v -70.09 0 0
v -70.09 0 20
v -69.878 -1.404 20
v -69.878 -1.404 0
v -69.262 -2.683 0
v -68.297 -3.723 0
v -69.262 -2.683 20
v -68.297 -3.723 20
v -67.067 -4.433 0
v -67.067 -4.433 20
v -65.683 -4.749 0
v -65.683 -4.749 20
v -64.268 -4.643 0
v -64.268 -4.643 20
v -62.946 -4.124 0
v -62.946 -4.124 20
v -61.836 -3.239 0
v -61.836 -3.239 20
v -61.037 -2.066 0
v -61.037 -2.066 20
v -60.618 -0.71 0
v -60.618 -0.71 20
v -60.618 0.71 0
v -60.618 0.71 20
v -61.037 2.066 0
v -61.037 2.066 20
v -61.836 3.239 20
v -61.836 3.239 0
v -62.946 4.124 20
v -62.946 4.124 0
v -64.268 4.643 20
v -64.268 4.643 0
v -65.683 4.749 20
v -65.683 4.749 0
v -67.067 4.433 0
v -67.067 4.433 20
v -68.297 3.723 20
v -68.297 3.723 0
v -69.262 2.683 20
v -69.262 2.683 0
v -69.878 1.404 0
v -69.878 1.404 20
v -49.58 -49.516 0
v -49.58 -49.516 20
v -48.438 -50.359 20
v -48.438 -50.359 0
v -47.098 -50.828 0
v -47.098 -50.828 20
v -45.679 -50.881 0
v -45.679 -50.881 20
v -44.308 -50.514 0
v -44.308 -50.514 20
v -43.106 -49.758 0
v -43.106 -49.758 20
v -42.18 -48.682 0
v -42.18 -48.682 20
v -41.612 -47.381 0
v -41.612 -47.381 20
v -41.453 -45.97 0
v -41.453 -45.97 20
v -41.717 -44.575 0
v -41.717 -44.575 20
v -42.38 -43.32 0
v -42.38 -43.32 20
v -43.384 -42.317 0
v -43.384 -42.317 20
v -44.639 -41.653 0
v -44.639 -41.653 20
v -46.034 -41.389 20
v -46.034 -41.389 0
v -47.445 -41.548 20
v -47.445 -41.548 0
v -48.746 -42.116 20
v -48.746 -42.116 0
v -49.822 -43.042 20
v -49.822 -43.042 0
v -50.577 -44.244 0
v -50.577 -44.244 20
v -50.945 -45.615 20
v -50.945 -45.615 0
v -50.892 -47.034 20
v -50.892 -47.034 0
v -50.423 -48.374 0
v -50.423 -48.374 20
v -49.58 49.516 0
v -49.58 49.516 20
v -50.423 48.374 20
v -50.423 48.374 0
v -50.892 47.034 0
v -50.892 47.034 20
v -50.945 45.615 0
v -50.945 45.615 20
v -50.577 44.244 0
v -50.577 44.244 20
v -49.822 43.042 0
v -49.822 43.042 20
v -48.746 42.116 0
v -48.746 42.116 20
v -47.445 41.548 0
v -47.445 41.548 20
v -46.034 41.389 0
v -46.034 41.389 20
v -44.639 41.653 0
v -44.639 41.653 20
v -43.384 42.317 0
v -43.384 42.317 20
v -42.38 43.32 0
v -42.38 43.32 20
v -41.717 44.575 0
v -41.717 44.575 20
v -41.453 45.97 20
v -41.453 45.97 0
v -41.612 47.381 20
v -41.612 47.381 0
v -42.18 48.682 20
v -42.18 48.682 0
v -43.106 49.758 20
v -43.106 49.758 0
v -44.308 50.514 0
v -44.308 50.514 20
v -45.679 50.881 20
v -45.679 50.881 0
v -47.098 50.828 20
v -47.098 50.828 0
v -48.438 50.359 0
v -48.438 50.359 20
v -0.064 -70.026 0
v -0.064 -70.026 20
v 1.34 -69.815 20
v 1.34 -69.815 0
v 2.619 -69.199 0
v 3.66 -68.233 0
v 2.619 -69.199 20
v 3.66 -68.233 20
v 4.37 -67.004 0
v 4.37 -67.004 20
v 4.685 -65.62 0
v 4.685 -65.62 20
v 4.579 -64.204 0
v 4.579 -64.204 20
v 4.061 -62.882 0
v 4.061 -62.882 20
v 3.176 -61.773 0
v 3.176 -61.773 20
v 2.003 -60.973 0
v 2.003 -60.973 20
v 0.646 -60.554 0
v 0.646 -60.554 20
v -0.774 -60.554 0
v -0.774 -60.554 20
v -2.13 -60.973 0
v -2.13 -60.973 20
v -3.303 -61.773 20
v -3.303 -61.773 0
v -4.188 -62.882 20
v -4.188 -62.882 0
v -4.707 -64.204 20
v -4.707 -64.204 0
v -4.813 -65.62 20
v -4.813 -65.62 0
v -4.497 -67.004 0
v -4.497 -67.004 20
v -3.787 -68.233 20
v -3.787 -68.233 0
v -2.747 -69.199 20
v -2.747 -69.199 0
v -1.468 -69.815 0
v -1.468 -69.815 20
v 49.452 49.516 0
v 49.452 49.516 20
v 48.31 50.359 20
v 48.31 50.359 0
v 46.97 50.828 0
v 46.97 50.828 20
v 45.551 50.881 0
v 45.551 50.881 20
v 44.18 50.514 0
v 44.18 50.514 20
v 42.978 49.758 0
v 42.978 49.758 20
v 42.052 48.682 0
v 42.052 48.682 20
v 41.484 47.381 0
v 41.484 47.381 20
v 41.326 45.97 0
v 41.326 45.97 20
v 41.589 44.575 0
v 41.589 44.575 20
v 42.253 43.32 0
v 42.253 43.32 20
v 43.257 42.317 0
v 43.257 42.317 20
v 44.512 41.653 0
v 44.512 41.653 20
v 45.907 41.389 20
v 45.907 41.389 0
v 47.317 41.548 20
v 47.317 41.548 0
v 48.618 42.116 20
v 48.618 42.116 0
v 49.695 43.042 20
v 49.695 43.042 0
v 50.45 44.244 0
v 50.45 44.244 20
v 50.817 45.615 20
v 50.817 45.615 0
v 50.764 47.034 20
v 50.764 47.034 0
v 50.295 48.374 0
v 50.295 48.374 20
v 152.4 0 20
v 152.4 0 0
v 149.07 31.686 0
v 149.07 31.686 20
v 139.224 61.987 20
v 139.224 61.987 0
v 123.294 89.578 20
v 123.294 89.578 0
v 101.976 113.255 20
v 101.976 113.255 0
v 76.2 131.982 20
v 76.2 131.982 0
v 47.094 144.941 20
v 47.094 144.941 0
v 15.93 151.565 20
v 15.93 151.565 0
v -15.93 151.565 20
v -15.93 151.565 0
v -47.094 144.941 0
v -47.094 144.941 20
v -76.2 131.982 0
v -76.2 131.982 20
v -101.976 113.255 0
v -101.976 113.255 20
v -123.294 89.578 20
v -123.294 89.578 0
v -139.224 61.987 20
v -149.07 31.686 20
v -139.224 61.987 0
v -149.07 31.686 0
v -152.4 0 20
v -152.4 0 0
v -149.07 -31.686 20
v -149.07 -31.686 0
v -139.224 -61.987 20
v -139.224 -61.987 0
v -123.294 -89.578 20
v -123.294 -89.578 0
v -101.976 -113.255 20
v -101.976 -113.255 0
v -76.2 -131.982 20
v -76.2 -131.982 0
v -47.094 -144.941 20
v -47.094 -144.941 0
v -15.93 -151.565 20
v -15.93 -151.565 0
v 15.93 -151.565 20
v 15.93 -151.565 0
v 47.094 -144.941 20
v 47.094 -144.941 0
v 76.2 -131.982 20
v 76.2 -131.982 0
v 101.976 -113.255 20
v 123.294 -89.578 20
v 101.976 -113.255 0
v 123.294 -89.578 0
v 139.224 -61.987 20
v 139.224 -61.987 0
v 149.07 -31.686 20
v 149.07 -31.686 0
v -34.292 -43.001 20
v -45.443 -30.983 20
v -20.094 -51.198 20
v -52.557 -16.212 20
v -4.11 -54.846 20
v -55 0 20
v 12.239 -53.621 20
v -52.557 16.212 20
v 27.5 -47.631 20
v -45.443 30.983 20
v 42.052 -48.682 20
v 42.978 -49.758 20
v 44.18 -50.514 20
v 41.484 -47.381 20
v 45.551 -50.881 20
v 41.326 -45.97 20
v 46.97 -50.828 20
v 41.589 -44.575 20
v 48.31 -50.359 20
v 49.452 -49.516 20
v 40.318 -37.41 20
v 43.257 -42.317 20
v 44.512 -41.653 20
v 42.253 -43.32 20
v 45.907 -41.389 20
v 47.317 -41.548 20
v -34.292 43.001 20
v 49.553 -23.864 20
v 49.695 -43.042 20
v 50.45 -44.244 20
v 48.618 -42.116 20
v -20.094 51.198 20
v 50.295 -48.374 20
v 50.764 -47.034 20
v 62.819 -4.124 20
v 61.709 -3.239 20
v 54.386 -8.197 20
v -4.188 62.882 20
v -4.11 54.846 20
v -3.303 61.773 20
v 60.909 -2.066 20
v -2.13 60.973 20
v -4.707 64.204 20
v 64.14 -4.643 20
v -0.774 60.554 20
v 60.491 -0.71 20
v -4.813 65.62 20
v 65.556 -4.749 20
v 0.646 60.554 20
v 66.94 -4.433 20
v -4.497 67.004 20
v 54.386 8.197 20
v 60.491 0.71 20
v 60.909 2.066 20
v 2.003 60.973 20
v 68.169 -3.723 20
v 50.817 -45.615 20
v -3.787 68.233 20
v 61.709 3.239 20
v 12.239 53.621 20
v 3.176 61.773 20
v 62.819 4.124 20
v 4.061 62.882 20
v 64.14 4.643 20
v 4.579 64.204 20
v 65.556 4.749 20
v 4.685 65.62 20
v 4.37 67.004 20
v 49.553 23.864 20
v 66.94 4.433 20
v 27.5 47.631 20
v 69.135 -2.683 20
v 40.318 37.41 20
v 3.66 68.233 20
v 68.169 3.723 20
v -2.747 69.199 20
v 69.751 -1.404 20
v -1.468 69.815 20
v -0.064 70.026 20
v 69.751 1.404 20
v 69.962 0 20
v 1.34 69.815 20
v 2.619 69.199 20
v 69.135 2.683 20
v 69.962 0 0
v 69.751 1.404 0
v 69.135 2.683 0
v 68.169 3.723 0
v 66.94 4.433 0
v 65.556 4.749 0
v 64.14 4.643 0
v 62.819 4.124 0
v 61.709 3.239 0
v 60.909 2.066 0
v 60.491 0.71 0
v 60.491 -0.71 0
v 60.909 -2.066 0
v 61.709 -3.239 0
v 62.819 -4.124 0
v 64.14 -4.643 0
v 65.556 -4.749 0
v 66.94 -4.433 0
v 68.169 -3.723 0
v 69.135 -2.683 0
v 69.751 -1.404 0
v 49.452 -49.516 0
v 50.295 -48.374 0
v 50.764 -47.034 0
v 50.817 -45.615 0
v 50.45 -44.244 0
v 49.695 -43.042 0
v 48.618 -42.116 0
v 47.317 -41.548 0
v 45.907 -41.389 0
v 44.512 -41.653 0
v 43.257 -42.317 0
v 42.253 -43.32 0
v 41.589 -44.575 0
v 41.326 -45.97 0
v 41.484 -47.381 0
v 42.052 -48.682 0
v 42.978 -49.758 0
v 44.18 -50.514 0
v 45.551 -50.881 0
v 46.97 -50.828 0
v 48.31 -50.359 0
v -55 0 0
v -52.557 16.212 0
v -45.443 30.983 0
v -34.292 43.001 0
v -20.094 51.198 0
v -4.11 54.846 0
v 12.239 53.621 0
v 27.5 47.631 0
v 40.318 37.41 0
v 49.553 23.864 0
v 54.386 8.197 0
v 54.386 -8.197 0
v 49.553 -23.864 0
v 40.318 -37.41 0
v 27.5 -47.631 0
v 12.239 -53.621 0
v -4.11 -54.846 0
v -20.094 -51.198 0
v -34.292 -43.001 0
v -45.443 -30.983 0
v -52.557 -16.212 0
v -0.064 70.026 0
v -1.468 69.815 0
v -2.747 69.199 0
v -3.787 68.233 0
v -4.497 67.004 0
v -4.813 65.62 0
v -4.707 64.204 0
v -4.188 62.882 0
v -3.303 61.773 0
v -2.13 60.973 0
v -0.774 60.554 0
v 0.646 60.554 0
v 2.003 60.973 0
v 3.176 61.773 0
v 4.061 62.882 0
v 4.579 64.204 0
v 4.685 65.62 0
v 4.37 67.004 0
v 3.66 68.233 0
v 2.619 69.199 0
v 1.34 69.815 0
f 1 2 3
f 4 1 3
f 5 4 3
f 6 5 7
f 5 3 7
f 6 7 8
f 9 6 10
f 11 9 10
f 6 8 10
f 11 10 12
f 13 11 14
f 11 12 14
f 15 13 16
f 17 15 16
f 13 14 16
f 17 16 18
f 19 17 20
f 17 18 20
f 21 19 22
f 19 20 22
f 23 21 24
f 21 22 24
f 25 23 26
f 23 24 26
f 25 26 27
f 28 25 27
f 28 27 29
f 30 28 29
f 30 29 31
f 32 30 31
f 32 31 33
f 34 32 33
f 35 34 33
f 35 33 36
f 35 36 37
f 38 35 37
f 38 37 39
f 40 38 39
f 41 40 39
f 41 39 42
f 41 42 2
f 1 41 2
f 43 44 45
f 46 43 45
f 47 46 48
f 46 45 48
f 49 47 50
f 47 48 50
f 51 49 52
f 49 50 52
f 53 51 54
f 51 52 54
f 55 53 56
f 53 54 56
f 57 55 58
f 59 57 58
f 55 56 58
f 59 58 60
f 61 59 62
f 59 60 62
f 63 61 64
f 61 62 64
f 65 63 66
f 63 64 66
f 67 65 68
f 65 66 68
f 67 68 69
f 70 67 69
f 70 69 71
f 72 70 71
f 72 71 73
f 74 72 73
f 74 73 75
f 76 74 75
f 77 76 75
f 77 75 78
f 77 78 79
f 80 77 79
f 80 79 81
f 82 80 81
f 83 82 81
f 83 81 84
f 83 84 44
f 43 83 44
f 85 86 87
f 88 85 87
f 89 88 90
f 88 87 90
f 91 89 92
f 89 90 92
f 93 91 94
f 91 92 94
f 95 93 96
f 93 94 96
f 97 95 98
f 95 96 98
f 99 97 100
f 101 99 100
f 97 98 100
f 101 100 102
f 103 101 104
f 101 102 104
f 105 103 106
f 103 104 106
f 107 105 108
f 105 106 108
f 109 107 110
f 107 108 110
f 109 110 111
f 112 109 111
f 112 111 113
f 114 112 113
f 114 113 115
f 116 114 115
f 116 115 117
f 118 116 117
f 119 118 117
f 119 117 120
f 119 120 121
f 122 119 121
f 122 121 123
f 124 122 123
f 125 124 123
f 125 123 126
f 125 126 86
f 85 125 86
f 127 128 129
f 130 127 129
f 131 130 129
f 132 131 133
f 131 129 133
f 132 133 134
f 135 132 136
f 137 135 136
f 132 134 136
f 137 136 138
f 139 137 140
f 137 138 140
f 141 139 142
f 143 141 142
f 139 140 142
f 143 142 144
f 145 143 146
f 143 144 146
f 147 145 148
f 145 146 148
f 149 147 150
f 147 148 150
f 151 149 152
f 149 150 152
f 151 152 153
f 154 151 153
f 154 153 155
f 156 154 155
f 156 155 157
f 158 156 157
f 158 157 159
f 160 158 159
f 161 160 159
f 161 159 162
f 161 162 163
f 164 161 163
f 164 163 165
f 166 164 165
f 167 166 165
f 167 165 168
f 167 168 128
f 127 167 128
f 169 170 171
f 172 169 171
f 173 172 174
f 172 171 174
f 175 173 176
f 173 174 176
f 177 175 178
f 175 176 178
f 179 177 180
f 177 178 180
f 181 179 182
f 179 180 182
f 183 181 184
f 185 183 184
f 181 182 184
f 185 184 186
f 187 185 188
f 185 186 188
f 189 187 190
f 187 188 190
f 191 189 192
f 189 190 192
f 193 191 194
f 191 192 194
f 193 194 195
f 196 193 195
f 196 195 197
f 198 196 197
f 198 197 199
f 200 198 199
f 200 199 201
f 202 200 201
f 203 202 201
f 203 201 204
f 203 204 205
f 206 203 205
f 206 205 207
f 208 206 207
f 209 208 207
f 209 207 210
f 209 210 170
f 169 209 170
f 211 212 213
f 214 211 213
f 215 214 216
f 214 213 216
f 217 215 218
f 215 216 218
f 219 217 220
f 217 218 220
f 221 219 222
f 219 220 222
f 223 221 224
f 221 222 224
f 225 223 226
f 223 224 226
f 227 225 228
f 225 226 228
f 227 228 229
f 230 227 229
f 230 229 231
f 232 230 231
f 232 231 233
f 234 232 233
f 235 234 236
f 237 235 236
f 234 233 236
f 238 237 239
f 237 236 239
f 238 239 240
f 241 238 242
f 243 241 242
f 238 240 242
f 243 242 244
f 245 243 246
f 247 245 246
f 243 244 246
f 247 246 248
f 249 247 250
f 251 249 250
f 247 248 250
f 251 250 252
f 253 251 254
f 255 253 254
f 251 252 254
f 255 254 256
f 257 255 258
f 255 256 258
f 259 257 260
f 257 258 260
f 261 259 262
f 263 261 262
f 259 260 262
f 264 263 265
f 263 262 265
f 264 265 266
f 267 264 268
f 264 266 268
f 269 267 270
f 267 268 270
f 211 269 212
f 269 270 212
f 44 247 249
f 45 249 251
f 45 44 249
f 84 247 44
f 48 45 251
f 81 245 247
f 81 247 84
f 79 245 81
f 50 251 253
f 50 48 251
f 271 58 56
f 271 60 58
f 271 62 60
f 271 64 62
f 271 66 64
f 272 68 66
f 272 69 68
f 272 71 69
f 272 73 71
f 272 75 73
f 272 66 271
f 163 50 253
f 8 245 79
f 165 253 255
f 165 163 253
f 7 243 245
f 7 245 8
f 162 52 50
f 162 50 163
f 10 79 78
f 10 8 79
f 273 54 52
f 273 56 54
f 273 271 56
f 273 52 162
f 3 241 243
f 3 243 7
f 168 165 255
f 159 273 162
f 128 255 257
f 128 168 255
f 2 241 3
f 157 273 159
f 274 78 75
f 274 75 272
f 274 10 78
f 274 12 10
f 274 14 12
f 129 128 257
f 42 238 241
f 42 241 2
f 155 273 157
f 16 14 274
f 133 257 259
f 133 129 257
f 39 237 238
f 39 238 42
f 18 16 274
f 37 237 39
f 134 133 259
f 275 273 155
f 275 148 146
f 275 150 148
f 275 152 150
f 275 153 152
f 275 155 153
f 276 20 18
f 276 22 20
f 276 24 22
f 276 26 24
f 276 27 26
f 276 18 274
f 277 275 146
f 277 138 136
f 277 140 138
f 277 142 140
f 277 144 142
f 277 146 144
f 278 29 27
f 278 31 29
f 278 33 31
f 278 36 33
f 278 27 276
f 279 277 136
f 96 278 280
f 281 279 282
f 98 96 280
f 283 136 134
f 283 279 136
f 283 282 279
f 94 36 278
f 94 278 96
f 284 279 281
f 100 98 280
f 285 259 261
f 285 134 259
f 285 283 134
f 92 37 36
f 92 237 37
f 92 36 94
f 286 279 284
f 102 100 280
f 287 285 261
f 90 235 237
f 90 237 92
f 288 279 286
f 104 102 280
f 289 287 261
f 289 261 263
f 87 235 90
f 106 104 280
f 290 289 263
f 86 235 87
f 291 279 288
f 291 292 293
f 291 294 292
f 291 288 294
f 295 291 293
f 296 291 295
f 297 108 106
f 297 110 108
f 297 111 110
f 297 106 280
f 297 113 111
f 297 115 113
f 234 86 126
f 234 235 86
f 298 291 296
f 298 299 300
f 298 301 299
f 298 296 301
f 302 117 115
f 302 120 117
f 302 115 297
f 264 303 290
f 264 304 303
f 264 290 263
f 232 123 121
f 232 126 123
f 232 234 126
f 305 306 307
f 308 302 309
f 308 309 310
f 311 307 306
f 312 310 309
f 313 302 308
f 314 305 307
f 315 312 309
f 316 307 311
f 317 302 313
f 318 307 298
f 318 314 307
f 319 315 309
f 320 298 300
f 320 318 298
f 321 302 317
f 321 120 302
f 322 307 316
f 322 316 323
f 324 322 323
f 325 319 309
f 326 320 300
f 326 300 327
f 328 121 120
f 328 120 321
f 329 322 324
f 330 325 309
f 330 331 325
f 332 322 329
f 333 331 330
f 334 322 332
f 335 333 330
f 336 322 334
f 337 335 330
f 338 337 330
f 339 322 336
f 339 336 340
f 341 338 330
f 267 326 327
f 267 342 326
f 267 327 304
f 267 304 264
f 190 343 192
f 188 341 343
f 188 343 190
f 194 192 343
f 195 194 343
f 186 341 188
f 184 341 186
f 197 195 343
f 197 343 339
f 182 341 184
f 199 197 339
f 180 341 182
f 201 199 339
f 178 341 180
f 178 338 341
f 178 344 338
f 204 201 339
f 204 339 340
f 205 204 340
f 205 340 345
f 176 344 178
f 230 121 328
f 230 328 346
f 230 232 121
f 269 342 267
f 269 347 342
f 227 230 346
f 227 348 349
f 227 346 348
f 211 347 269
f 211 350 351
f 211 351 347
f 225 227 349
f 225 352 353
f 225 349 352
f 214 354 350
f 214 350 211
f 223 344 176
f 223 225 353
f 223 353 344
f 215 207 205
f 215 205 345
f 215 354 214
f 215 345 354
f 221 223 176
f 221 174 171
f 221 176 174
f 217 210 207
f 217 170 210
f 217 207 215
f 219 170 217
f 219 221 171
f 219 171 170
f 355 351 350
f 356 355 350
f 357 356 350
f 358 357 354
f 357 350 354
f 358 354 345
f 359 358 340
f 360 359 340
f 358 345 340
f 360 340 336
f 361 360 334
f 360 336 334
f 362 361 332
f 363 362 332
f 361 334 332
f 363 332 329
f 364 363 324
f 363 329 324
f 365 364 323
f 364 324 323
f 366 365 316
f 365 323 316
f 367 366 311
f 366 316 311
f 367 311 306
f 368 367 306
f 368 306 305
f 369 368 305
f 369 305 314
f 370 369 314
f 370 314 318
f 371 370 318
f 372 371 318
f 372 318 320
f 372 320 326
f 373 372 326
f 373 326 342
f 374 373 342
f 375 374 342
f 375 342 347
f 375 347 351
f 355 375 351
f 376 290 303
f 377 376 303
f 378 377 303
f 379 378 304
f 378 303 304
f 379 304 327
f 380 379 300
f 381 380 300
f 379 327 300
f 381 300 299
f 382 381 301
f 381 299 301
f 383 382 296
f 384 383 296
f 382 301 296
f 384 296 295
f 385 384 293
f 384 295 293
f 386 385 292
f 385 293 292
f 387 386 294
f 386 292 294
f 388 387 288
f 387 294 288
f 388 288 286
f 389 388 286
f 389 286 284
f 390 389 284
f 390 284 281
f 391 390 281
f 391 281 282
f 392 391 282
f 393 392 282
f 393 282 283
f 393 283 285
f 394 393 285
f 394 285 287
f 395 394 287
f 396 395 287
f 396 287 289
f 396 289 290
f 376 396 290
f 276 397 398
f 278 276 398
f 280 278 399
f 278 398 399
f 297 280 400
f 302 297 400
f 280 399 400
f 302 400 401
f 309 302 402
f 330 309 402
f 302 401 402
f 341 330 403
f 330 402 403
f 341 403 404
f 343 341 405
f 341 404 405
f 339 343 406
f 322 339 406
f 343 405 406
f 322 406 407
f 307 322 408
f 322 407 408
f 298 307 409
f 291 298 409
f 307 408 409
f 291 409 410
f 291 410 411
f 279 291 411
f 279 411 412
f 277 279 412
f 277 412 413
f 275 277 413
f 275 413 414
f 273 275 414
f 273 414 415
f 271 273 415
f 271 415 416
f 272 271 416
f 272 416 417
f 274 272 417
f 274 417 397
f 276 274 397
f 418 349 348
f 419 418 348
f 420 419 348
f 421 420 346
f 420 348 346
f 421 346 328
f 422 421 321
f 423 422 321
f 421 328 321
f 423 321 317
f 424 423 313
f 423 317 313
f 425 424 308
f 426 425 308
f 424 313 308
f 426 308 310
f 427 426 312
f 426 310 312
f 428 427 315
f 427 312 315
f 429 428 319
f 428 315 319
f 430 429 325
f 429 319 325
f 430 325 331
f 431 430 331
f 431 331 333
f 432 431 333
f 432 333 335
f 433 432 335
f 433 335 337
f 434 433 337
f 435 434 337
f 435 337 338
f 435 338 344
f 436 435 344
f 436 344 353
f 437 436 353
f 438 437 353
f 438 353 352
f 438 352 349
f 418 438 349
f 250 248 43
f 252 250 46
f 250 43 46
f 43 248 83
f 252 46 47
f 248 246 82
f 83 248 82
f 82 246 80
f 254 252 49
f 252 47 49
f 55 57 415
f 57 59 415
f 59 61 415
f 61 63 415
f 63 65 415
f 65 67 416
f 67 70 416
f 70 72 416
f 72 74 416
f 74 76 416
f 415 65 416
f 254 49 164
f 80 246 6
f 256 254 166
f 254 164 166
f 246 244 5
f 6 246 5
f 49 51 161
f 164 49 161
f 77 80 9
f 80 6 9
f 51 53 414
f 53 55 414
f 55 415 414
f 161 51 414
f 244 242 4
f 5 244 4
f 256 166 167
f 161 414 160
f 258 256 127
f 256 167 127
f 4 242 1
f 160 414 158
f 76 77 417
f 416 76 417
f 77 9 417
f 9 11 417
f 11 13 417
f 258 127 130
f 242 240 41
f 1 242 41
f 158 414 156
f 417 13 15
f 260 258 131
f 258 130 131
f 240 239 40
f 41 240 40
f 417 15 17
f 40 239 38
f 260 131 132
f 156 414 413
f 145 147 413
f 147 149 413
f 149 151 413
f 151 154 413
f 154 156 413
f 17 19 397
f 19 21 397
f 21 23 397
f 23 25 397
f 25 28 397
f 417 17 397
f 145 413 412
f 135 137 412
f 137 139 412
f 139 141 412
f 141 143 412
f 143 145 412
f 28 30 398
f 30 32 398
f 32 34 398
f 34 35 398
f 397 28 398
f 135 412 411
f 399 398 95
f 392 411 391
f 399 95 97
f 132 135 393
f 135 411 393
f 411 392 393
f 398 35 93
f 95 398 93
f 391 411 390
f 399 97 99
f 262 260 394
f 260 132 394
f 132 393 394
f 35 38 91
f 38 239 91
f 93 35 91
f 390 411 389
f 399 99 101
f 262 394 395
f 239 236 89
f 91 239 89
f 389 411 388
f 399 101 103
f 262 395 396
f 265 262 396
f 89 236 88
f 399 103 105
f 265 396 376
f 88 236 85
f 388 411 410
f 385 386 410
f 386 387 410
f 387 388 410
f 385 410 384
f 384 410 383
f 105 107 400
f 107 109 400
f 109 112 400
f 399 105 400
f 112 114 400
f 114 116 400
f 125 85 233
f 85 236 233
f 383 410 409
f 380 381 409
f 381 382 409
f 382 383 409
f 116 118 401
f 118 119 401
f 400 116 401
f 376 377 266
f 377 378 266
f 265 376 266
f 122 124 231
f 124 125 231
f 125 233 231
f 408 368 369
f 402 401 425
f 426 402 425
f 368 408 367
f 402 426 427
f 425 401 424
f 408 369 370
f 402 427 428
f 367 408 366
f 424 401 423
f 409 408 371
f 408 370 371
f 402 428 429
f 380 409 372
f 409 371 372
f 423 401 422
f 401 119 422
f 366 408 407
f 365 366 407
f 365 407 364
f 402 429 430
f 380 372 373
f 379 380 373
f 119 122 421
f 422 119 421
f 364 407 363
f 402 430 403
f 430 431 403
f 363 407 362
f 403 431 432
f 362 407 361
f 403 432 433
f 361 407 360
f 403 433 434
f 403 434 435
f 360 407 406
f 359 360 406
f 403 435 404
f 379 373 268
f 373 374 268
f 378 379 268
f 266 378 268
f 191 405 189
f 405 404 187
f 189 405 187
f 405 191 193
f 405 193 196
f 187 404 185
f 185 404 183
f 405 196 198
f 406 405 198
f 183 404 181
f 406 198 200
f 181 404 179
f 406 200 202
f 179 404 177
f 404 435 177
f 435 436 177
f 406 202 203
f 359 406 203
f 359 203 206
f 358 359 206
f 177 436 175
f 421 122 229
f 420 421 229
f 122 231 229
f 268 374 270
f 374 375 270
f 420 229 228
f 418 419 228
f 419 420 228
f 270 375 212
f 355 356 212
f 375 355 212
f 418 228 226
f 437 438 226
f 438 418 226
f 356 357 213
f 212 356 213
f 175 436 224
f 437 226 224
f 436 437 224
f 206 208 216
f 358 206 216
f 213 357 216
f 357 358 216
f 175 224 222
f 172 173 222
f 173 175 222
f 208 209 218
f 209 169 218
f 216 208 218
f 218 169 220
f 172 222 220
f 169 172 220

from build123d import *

# Parameters (mm, degrees)
SKETCH1_R                    = 152.4
BOSS_EXTRUDE1_DEPTH          = 20
F_3_8_0_375_DIAMETER_HOLE1_D = 9.525
CIRPATTERN1_COUNT            = 8
SKETCH5_R                    = 55
CUT_EXTRUDE1_DEPTH           = 217.452119417


with BuildPart() as part:
    # Sketch1 → Boss-Extrude1 (new body)
    with BuildSketch(Plane.XY):
        Circle(SKETCH1_R)
    extrude(amount=BOSS_EXTRUDE1_DEPTH)

    # 3/8 (0.375) Diameter Hole1 (through all)
    with Locations(Plane(origin=(0, 0, 0), x_dir=(-1, 0, 0), z_dir=(0, 0, -1))):
        with Locations((-65.2, 0)):
            f_3_8_0_375_diameter_hole1 = Hole(F_3_8_0_375_DIAMETER_HOLE1_D / 2)

    # CirPattern1: 3/8 (0.375) Diameter Hole1 ×8 about axis
    cirpattern1_axis = Axis((-0.063734115, 0, 0), (0, 0, 1))
    for i in range(1, CIRPATTERN1_COUNT):
        add(f_3_8_0_375_diameter_hole1.rotate(cirpattern1_axis, i * 360 / CIRPATTERN1_COUNT), mode=Mode.SUBTRACT)

    # Sketch5 → Cut-Extrude1 (cut, through all)
    with BuildSketch(Plane(origin=(0, 0, 0), x_dir=(-1, 0, 0), z_dir=(0, 0, -1))):
        Circle(SKETCH5_R)
    extrude(amount=-CUT_EXTRUDE1_DEPTH, mode=Mode.SUBTRACT)


solid = part.part
